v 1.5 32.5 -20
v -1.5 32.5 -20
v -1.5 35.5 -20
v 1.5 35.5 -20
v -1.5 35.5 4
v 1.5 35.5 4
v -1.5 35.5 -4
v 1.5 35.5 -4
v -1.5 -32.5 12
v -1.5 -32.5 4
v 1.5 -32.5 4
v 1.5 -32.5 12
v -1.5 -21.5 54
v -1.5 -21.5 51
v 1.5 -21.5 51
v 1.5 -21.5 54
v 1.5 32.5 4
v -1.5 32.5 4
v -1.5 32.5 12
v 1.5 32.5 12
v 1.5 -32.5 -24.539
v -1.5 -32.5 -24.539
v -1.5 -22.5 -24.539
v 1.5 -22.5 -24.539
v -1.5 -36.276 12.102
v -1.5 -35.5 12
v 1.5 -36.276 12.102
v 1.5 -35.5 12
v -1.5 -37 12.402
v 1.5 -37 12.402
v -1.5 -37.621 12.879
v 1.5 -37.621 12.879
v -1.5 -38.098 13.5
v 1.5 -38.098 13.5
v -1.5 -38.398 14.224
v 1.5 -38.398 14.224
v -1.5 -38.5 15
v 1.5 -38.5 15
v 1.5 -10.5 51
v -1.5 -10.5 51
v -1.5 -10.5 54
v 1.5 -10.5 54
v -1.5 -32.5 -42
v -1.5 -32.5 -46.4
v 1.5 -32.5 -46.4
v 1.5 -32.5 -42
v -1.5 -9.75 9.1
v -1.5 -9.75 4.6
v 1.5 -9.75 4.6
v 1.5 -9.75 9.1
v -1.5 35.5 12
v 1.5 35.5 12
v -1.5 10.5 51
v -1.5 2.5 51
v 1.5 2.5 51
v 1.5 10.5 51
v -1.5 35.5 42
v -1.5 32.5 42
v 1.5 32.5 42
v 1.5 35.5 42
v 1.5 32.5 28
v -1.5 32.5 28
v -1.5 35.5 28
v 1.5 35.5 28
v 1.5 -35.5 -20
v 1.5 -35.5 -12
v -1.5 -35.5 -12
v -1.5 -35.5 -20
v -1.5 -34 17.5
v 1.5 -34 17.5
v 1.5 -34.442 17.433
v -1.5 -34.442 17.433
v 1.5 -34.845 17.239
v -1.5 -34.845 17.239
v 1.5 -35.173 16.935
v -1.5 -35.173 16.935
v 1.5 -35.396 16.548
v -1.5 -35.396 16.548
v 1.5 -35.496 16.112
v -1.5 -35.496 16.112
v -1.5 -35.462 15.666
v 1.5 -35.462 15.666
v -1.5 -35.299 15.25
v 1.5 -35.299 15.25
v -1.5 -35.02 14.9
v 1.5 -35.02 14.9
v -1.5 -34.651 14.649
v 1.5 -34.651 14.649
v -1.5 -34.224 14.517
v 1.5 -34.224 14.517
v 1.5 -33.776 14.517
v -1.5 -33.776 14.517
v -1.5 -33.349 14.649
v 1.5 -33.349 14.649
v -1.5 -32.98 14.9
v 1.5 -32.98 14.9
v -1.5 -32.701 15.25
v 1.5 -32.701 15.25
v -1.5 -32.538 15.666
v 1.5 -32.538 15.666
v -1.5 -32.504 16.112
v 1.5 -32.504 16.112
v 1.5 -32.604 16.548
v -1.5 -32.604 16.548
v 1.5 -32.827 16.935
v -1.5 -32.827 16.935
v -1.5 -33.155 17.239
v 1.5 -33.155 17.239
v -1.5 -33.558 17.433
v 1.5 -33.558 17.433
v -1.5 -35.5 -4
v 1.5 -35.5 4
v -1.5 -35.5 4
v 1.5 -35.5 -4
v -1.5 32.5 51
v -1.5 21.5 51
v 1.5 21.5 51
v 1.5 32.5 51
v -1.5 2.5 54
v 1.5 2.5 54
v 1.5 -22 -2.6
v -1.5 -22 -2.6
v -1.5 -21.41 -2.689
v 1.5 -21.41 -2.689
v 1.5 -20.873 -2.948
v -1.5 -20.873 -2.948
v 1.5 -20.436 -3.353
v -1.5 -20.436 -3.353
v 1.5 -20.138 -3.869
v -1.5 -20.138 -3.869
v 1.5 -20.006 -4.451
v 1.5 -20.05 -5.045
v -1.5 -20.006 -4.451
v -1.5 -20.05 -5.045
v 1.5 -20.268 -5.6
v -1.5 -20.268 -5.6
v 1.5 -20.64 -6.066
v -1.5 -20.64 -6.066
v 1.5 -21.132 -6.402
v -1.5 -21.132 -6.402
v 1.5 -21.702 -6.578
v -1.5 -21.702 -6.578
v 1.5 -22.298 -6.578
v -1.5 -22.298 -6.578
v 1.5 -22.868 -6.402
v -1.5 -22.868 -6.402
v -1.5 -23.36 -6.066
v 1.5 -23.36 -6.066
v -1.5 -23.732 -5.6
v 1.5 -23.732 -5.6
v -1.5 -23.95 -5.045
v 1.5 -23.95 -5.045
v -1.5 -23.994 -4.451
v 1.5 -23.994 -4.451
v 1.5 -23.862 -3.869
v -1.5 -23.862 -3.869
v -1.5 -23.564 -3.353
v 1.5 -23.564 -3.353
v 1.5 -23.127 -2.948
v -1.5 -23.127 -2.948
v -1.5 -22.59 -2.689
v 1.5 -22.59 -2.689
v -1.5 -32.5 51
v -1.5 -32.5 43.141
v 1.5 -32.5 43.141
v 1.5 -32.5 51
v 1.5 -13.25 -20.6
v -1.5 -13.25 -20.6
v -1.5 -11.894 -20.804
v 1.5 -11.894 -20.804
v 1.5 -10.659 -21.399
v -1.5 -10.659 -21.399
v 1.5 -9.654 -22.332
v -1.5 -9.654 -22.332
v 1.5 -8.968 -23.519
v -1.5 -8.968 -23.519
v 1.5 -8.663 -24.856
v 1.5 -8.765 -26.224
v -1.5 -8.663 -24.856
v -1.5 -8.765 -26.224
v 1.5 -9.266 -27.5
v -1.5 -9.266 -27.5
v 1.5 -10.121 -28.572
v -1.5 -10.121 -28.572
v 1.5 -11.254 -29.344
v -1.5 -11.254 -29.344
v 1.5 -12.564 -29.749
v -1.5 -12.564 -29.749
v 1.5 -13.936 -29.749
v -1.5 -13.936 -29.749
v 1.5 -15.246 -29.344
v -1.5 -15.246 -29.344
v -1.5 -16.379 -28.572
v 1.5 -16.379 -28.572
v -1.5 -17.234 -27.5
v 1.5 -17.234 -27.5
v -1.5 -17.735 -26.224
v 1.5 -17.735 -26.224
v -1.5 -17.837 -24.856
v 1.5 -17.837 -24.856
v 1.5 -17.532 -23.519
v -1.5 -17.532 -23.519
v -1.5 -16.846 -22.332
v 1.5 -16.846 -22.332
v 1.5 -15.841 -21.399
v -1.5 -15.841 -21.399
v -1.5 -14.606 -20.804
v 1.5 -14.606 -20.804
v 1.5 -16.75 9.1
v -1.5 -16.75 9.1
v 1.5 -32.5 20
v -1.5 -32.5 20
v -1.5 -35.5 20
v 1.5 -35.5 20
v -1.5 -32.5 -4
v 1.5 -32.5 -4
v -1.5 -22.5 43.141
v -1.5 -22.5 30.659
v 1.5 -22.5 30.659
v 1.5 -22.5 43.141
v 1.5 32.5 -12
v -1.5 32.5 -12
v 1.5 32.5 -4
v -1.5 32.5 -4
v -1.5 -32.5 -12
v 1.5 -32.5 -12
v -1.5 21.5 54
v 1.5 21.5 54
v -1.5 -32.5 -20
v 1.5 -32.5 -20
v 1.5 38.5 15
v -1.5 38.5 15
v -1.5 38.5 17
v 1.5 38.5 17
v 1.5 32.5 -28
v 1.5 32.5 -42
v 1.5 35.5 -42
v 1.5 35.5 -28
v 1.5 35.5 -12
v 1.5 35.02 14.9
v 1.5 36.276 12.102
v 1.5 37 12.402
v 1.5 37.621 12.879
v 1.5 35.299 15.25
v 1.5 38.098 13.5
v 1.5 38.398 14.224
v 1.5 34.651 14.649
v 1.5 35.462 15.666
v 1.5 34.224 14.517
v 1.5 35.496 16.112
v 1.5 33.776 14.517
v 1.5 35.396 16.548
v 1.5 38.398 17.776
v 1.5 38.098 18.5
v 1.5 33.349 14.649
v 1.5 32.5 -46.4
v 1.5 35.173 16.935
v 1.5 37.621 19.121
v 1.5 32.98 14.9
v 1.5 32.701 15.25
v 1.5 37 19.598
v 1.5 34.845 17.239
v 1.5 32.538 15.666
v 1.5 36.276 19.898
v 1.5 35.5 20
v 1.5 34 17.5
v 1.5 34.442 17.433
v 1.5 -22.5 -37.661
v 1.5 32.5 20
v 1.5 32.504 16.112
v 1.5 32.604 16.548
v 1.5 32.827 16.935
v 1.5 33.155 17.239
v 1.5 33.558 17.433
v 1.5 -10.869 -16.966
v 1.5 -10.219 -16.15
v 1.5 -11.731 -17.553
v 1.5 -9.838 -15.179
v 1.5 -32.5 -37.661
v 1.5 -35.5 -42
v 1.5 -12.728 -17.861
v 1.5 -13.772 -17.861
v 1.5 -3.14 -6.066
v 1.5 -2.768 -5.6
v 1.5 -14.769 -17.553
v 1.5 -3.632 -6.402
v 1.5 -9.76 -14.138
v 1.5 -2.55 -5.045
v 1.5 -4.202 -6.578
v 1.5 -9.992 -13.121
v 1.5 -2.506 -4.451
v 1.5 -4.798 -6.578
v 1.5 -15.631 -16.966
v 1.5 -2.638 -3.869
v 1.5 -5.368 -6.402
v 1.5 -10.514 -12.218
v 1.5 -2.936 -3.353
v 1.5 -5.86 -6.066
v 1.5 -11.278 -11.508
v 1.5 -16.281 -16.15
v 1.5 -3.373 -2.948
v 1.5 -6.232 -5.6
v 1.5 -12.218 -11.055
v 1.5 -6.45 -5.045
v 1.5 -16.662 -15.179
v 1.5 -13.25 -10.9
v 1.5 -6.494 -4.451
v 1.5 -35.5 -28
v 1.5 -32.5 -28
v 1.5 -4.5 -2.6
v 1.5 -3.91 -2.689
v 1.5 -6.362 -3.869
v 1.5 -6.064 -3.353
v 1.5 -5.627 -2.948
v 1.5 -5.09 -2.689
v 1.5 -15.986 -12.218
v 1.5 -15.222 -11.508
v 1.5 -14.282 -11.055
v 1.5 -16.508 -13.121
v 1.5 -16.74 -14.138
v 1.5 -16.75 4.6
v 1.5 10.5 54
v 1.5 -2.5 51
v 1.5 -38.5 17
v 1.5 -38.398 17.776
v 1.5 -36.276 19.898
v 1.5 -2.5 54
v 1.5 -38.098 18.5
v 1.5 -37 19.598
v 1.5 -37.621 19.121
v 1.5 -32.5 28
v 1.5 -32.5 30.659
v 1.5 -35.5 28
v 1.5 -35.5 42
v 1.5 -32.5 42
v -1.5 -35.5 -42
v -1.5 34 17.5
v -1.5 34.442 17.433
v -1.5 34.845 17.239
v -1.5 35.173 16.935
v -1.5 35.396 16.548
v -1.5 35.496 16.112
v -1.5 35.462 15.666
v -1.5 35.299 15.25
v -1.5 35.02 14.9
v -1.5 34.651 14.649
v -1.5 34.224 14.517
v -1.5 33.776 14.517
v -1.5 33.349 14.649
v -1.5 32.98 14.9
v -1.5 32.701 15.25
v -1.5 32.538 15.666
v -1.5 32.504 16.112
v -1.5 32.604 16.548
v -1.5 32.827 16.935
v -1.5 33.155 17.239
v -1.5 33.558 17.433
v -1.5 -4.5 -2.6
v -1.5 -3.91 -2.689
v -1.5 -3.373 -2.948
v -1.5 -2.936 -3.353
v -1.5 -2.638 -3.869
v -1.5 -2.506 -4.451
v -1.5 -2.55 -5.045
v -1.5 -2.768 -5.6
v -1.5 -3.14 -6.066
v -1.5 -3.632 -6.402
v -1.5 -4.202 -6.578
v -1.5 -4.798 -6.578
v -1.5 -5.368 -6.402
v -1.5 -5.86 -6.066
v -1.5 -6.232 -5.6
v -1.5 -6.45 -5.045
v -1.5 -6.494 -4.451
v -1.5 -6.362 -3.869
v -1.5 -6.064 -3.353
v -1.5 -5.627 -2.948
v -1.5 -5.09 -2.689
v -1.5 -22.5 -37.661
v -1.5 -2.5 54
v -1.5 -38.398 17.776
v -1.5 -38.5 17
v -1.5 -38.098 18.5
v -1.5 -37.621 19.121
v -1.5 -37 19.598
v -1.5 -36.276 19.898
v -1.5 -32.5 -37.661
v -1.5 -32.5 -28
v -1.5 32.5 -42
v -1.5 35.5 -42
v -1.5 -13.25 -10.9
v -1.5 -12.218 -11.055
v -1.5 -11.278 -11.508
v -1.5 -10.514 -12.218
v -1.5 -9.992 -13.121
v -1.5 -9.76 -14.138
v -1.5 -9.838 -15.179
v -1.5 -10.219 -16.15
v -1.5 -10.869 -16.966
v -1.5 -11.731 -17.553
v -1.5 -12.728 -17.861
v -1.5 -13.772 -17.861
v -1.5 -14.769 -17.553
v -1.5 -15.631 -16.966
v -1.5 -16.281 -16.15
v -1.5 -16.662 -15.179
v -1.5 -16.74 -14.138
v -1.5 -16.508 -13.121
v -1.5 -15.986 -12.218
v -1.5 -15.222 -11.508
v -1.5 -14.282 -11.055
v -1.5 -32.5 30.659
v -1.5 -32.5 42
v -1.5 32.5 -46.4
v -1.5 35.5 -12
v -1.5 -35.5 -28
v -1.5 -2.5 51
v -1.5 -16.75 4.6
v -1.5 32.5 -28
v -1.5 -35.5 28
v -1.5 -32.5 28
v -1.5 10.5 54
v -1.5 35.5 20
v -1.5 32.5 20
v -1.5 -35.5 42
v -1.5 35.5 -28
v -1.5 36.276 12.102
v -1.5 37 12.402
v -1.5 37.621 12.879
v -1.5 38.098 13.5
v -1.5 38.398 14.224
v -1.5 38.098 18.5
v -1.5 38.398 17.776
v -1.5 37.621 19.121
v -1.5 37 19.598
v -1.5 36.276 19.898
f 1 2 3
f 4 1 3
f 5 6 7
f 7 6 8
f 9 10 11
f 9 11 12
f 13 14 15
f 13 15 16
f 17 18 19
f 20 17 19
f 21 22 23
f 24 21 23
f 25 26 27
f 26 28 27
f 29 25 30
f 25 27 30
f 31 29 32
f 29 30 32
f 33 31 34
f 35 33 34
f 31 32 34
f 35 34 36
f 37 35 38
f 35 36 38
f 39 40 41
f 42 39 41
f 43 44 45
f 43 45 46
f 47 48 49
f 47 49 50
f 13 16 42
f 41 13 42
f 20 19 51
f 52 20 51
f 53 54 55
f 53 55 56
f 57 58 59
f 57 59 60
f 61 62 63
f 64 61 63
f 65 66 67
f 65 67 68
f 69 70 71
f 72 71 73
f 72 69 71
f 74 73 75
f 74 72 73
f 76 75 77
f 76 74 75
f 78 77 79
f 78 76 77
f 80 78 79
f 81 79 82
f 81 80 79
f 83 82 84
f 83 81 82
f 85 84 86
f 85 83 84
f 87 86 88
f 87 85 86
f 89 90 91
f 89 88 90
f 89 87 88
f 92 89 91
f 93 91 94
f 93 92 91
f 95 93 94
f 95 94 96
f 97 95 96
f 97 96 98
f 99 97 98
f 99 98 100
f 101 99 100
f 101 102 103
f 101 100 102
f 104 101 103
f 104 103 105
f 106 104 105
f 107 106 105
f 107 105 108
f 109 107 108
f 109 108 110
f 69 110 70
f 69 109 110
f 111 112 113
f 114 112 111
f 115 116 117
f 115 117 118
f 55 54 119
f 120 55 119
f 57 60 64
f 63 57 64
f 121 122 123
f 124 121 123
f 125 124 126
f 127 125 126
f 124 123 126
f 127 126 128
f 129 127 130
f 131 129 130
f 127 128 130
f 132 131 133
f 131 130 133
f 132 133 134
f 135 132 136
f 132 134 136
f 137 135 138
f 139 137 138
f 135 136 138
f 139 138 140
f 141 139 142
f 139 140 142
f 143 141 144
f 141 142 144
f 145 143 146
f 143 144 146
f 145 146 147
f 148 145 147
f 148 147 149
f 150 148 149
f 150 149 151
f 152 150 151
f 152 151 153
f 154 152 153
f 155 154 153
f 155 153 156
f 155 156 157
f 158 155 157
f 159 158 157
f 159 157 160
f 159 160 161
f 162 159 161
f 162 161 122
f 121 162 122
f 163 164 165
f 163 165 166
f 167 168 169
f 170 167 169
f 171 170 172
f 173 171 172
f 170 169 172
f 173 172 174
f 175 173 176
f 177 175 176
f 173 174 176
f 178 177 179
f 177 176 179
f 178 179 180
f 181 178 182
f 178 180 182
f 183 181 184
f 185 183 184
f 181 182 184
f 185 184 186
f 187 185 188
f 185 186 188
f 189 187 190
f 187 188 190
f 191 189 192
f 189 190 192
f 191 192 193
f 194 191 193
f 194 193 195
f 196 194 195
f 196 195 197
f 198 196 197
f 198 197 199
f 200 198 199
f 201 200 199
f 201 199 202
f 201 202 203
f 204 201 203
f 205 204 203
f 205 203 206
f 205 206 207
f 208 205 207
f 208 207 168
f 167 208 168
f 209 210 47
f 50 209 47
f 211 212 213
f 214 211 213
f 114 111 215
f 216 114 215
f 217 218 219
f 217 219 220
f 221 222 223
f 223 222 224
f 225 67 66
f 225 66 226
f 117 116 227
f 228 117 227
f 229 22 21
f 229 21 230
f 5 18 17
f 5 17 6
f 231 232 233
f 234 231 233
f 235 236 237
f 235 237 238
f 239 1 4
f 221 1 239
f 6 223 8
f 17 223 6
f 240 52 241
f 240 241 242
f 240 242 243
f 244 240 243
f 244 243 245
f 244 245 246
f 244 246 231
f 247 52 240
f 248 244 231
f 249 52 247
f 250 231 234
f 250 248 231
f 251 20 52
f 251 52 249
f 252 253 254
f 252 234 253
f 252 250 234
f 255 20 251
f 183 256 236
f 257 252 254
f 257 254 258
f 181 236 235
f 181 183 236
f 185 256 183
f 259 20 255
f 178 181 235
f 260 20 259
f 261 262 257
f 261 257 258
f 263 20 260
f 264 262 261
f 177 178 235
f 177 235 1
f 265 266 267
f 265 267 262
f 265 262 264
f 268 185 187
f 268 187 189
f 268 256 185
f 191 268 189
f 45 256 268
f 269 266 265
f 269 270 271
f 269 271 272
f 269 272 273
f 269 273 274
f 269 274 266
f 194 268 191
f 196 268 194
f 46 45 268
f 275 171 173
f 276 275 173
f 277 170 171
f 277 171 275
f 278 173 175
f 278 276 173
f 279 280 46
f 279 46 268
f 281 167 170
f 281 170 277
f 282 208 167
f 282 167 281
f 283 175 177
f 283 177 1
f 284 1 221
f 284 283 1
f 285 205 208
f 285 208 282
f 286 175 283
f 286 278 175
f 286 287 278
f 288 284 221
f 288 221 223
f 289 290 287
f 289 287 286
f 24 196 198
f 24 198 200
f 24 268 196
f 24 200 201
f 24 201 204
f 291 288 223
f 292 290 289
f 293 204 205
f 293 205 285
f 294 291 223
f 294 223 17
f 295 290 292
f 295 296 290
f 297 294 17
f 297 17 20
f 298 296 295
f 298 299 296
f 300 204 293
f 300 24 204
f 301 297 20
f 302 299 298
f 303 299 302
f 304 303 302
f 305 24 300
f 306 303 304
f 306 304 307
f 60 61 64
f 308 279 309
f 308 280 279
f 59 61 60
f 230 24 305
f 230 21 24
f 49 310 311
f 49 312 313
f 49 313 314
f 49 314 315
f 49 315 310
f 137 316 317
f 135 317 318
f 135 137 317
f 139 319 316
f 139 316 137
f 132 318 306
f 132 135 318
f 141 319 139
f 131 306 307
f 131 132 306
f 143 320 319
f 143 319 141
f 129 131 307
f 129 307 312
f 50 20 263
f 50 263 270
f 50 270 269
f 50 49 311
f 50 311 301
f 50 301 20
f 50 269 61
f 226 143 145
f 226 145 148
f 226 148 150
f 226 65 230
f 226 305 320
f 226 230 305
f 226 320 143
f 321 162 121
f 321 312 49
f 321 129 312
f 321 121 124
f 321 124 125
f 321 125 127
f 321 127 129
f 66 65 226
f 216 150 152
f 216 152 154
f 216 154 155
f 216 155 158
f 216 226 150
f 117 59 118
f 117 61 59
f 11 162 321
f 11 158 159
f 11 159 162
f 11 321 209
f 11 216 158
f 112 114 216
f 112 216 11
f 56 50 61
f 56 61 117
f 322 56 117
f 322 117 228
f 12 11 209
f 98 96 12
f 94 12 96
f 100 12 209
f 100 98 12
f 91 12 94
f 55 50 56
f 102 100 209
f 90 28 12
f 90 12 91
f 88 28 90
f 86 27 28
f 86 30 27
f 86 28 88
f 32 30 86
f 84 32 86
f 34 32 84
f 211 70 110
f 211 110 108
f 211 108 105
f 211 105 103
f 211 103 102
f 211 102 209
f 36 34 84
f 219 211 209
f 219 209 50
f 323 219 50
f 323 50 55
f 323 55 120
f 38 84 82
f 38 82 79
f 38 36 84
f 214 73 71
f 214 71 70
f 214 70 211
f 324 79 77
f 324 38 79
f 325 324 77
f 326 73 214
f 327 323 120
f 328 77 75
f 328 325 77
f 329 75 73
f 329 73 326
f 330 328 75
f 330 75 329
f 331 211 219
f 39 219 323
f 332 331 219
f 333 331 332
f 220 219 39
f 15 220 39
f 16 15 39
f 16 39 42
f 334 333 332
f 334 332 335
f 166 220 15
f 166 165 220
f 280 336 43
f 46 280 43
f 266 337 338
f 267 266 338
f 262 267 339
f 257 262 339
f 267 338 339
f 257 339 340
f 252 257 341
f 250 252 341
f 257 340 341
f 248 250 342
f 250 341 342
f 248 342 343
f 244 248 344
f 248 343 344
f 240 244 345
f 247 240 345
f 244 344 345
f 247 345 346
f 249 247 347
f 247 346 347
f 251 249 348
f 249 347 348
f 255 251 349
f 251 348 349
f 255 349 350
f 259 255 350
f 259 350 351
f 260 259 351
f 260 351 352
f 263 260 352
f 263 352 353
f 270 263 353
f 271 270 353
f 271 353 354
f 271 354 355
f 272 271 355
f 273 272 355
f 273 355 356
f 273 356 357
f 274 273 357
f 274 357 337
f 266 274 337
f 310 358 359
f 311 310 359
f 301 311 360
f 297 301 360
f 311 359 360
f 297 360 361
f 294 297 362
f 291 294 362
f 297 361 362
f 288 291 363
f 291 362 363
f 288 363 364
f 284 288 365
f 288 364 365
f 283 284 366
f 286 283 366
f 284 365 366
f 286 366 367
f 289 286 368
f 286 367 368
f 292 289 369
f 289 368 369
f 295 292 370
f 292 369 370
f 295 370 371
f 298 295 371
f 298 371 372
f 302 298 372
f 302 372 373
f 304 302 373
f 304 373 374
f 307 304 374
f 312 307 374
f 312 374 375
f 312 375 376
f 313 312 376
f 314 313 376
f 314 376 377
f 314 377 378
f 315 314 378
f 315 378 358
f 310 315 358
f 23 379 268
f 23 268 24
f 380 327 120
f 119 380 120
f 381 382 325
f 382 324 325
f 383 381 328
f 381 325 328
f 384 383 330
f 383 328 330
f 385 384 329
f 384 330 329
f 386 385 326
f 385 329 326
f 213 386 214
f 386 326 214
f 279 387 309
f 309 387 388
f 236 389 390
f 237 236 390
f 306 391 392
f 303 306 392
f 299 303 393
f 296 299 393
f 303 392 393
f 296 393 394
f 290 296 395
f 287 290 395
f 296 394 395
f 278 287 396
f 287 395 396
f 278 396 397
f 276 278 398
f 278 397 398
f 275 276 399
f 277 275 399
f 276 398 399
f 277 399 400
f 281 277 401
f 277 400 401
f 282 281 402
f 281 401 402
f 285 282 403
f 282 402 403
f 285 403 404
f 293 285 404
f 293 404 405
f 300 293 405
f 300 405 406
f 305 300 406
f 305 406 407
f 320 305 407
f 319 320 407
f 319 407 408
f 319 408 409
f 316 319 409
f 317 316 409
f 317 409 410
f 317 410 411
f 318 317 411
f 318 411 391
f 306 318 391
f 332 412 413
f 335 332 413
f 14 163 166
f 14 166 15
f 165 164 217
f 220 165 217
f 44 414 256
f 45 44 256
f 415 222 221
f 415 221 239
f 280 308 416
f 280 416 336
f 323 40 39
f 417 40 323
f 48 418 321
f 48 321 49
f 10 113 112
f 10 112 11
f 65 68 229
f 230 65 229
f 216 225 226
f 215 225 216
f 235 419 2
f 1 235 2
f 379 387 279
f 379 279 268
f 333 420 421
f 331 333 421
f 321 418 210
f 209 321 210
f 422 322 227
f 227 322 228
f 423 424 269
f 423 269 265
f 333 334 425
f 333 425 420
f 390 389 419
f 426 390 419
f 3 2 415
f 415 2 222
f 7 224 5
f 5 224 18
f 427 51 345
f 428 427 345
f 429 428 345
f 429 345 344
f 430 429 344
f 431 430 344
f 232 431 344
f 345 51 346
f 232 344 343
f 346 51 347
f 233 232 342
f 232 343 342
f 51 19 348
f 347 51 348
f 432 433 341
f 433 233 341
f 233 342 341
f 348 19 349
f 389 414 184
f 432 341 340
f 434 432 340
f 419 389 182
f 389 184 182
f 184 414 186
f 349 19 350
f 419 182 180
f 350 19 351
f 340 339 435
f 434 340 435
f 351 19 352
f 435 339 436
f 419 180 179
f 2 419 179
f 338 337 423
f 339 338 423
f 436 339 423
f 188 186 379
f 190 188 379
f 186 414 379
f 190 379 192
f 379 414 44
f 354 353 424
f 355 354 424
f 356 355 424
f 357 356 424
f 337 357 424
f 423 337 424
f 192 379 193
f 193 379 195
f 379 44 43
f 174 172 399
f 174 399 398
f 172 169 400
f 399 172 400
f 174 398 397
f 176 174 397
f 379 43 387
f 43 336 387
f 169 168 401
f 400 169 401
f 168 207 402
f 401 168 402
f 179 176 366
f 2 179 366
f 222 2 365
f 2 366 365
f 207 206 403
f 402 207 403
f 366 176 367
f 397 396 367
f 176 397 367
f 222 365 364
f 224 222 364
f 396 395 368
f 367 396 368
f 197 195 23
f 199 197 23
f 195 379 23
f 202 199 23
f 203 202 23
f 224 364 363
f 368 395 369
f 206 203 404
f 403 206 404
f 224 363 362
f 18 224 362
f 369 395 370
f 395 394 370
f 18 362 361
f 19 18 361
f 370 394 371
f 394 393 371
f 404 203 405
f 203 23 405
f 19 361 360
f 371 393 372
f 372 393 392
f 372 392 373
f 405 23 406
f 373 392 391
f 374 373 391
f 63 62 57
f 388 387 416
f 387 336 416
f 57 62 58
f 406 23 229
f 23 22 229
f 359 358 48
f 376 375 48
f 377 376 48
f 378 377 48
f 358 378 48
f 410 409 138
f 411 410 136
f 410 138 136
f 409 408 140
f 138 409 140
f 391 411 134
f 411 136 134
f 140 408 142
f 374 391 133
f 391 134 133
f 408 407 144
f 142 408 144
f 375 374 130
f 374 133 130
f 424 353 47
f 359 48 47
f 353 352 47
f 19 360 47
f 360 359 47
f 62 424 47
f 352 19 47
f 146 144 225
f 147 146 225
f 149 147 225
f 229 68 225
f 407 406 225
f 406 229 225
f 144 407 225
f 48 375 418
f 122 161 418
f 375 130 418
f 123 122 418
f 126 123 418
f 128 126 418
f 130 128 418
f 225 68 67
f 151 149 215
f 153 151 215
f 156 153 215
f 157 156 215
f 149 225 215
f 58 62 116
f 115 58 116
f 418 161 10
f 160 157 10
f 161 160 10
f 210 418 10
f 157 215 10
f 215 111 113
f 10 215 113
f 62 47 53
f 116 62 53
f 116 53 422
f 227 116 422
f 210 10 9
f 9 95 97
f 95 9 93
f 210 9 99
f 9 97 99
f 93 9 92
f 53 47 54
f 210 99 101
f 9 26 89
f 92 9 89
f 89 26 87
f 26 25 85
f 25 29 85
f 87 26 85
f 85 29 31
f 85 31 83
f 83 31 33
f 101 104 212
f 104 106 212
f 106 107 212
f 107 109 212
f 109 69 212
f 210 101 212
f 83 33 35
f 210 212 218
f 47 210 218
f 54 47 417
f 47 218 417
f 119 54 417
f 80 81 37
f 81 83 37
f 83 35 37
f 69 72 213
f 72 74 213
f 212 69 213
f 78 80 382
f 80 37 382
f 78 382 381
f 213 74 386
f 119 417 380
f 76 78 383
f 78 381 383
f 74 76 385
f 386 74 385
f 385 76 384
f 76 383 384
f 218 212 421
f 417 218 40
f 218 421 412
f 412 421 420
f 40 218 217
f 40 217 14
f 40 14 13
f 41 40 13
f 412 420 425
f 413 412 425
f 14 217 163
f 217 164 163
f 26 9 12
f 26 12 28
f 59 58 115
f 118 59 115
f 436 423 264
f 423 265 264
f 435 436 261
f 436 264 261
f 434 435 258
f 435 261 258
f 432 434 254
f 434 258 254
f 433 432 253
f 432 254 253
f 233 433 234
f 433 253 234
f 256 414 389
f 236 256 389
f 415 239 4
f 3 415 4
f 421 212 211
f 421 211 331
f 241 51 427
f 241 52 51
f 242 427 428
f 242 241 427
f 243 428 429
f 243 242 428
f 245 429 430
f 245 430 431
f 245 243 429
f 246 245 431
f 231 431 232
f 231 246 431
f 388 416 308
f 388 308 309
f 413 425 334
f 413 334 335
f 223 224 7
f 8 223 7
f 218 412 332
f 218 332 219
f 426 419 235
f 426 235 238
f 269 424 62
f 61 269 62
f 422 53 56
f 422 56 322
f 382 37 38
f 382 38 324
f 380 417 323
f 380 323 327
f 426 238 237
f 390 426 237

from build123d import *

# Parameters (mm, degrees)
CROQUIS1_W               = 108
CROQUIS1_H               = 71
SALIENTE_EXTRUIR1_DEPTH  = 1.5
CROQUIS2_W               = 12
CROQUIS2_H               = 3
CROQUIS2_W_2             = 8
CORTAR_EXTRUIR1_DEPTH    = 3
CROQUIS4_W               = 8
CROQUIS4_H               = 3
SALIENTE_EXTRUIR2_DEPTH  = 3
REDONDEO1_R              = 3
CROQUIS5_R               = 1.5
CORTAR_EXTRUIR2_DEPTH    = 13
REDONDEO1_OF_SIMETR_A2_R = 3
CROQUIS6_W               = 3
CROQUIS6_H               = 14
CROQUIS6_H_2             = 8
CORTAR_EXTRUIR3_DEPTH    = 3
CROQUIS7_W               = 3.217414859
CROQUIS7_H               = 7.6
CORTAR_EXTRUIR4_DEPTH    = 73
CROQUIS8_R               = 1.5
CROQUIS8_R_2             = 2.5
CROQUIS8_R_3             = 3.6
CROQUIS8_W               = 2.5
CROQUIS8_H               = 6
CORTAR_EXTRUIR5_DEPTH    = 10
CROQUIS9_R               = 2
CROQUIS9_R_2             = 3.5
CROQUIS9_R_3             = 4.6
CROQUIS9_W               = 4.5
CROQUIS9_H               = 7
CORTAR_EXTRUIR6_DEPTH    = 10
CROQUIS10_W              = 13.122983438
CROQUIS10_H              = 10
CORTAR_EXTRUIR7_DEPTH    = 10
CROQUIS11_W              = 12.481361742
CROQUIS11_H              = 10
CORTAR_EXTRUIR8_DEPTH    = 10


with BuildPart() as part:
    # Croquis1 → Saliente-Extruir1 (new, symmetric)
    with BuildSketch(Plane(origin=(0, 0, 0), x_dir=(0, 0, -1), z_dir=(1, 0, 0))):
        Rectangle(CROQUIS1_W, CROQUIS1_H)
    extrude(amount=SALIENTE_EXTRUIR1_DEPTH, both=True)

    # Croquis2 → Cortar-Extruir1 (cut)
    with BuildSketch(Plane.ZY.offset(1.5)):
        with Locations((-48, -34)):
            Rectangle(CROQUIS2_W, CROQUIS2_H)
        with Locations((-24, -34)):
            Rectangle(CROQUIS2_W_2, CROQUIS2_H)
        with Locations((-8, -34)):
            Rectangle(CROQUIS2_W_2, CROQUIS2_H)
        with Locations((8, -34)):
            Rectangle(CROQUIS2_W_2, CROQUIS2_H)
        with Locations((24, -34)):
            Rectangle(CROQUIS2_W_2, CROQUIS2_H)
        with Locations((48, -34)):
            Rectangle(CROQUIS2_W, CROQUIS2_H)
        with Locations((48, 34)):
            Rectangle(CROQUIS2_W, CROQUIS2_H)
        with Locations((24, 34)):
            Rectangle(CROQUIS2_W_2, CROQUIS2_H)
        with Locations((8, 34)):
            Rectangle(CROQUIS2_W_2, CROQUIS2_H)
        with Locations((-8, 34)):
            Rectangle(CROQUIS2_W_2, CROQUIS2_H)
        with Locations((-24, 34)):
            Rectangle(CROQUIS2_W_2, CROQUIS2_H)
        with Locations((-48, 34)):
            Rectangle(CROQUIS2_W, CROQUIS2_H)
    extrude(amount=-CORTAR_EXTRUIR1_DEPTH, mode=Mode.SUBTRACT)

    # Croquis4 → Saliente-Extruir2 (add)
    with BuildSketch(Plane.ZY.offset(1.5)):
        with Locations((16, 37)):
            Rectangle(CROQUIS4_W, CROQUIS4_H)
    saliente_extruir2 = extrude(amount=-SALIENTE_EXTRUIR2_DEPTH)

    # Redondeo1
    redondeo1_edges = [part.edges().sort_by_distance(p)[0] for p in [
        (0, 38.5, 12),
        (0, 38.5, 20),
    ]]
    fillet(redondeo1_edges, radius=REDONDEO1_R)

    # Croquis5 → Cortar-Extruir2 (cut)
    with BuildSketch(Plane.ZY.offset(1.5)):
        with Locations((16, 34)):
            Circle(CROQUIS5_R)
    cortar_extruir2 = extrude(amount=-CORTAR_EXTRUIR2_DEPTH, mode=Mode.SUBTRACT)

    # Simetría2: Saliente-Extruir2, Cortar-Extruir2 across plane
    add(saliente_extruir2.mirror(Plane.ZX))
    add(cortar_extruir2.mirror(Plane.ZX), mode=Mode.SUBTRACT)

    # Redondeo1 of Simetría2
    redondeo1_of_simetr_a2_edges = [part.edges().sort_by_distance(p)[0] for p in [
        (0, -38.5, 12),
        (0, -38.5, 20),
    ]]
    fillet(redondeo1_of_simetr_a2_edges, radius=REDONDEO1_OF_SIMETR_A2_R)

    # Croquis6 → Cortar-Extruir3 (cut)
    with BuildSketch(Plane.ZY.offset(1.5)):
        with Locations((52.5, -28.5)):
            Rectangle(CROQUIS6_W, CROQUIS6_H)
        with Locations((52.5, -6.5)):
            Rectangle(CROQUIS6_W, CROQUIS6_H_2)
        with Locations((52.5, 6.5)):
            Rectangle(CROQUIS6_W, CROQUIS6_H_2)
        with Locations((52.5, 28.5)):
            Rectangle(CROQUIS6_W, CROQUIS6_H)
    extrude(amount=-CORTAR_EXTRUIR3_DEPTH, mode=Mode.SUBTRACT)

    # Croquis7 → Cortar-Extruir4 (cut)
    with BuildSketch(Plane(origin=(0, 32.5, 0), x_dir=(1, 0, 0), z_dir=(0, 1, 0))):
        with Locations((-0.10870743, 50.2)):
            Rectangle(CROQUIS7_W, CROQUIS7_H)
    extrude(amount=-CORTAR_EXTRUIR4_DEPTH, mode=Mode.SUBTRACT)

    # Croquis8 → Cortar-Extruir5 (cut)
    with BuildSketch(Plane(origin=(1.5, 0, 0), x_dir=(0, 0, -1), z_dir=(1, 0, 0))):
        with Locations((4.6, -4.5)):
            Circle(CROQUIS8_R)
        with Locations((4.6, -22)):
            Circle(CROQUIS8_R)
        with Locations((14.4, -13.25)):
            Circle(CROQUIS8_R_2)
        with Locations((25.2, -13.25)):
            Circle(CROQUIS8_R_3)
        with Locations((-6.85, -13.25)):
            Rectangle(CROQUIS8_W, CROQUIS8_H)
    extrude(amount=-CORTAR_EXTRUIR5_DEPTH, mode=Mode.SUBTRACT)

    # Croquis9 → Cortar-Extruir6 (cut)
    with BuildSketch(Plane.ZY.offset(1.5)):
        with Locations((-4.6, -22)):
            Circle(CROQUIS9_R)
        with Locations((-4.6, -4.5)):
            Circle(CROQUIS9_R)
        with Locations((-14.4, -13.25)):
            Circle(CROQUIS9_R_2)
        with Locations((-25.2, -13.25)):
            Circle(CROQUIS9_R_3)
        with Locations((6.85, -13.25)):
            Rectangle(CROQUIS9_W, CROQUIS9_H)
    extrude(amount=-CORTAR_EXTRUIR6_DEPTH, mode=Mode.SUBTRACT)

    # Croquis10 → Cortar-Extruir7 (cut)
    with BuildSketch(Plane.ZY.offset(1.5)):
        with Locations((-31.1, -27.5)):
            Rectangle(CROQUIS10_W, CROQUIS10_H)
    extrude(amount=-CORTAR_EXTRUIR7_DEPTH, mode=Mode.SUBTRACT)

    # Croquis11 → Cortar-Extruir8 (cut)
    with BuildSketch(Plane.ZY.offset(1.5)):
        with Locations((36.9, -27.5)):
            Rectangle(CROQUIS11_W, CROQUIS11_H)
    extrude(amount=-CORTAR_EXTRUIR8_DEPTH, mode=Mode.SUBTRACT)


solid = part.part
